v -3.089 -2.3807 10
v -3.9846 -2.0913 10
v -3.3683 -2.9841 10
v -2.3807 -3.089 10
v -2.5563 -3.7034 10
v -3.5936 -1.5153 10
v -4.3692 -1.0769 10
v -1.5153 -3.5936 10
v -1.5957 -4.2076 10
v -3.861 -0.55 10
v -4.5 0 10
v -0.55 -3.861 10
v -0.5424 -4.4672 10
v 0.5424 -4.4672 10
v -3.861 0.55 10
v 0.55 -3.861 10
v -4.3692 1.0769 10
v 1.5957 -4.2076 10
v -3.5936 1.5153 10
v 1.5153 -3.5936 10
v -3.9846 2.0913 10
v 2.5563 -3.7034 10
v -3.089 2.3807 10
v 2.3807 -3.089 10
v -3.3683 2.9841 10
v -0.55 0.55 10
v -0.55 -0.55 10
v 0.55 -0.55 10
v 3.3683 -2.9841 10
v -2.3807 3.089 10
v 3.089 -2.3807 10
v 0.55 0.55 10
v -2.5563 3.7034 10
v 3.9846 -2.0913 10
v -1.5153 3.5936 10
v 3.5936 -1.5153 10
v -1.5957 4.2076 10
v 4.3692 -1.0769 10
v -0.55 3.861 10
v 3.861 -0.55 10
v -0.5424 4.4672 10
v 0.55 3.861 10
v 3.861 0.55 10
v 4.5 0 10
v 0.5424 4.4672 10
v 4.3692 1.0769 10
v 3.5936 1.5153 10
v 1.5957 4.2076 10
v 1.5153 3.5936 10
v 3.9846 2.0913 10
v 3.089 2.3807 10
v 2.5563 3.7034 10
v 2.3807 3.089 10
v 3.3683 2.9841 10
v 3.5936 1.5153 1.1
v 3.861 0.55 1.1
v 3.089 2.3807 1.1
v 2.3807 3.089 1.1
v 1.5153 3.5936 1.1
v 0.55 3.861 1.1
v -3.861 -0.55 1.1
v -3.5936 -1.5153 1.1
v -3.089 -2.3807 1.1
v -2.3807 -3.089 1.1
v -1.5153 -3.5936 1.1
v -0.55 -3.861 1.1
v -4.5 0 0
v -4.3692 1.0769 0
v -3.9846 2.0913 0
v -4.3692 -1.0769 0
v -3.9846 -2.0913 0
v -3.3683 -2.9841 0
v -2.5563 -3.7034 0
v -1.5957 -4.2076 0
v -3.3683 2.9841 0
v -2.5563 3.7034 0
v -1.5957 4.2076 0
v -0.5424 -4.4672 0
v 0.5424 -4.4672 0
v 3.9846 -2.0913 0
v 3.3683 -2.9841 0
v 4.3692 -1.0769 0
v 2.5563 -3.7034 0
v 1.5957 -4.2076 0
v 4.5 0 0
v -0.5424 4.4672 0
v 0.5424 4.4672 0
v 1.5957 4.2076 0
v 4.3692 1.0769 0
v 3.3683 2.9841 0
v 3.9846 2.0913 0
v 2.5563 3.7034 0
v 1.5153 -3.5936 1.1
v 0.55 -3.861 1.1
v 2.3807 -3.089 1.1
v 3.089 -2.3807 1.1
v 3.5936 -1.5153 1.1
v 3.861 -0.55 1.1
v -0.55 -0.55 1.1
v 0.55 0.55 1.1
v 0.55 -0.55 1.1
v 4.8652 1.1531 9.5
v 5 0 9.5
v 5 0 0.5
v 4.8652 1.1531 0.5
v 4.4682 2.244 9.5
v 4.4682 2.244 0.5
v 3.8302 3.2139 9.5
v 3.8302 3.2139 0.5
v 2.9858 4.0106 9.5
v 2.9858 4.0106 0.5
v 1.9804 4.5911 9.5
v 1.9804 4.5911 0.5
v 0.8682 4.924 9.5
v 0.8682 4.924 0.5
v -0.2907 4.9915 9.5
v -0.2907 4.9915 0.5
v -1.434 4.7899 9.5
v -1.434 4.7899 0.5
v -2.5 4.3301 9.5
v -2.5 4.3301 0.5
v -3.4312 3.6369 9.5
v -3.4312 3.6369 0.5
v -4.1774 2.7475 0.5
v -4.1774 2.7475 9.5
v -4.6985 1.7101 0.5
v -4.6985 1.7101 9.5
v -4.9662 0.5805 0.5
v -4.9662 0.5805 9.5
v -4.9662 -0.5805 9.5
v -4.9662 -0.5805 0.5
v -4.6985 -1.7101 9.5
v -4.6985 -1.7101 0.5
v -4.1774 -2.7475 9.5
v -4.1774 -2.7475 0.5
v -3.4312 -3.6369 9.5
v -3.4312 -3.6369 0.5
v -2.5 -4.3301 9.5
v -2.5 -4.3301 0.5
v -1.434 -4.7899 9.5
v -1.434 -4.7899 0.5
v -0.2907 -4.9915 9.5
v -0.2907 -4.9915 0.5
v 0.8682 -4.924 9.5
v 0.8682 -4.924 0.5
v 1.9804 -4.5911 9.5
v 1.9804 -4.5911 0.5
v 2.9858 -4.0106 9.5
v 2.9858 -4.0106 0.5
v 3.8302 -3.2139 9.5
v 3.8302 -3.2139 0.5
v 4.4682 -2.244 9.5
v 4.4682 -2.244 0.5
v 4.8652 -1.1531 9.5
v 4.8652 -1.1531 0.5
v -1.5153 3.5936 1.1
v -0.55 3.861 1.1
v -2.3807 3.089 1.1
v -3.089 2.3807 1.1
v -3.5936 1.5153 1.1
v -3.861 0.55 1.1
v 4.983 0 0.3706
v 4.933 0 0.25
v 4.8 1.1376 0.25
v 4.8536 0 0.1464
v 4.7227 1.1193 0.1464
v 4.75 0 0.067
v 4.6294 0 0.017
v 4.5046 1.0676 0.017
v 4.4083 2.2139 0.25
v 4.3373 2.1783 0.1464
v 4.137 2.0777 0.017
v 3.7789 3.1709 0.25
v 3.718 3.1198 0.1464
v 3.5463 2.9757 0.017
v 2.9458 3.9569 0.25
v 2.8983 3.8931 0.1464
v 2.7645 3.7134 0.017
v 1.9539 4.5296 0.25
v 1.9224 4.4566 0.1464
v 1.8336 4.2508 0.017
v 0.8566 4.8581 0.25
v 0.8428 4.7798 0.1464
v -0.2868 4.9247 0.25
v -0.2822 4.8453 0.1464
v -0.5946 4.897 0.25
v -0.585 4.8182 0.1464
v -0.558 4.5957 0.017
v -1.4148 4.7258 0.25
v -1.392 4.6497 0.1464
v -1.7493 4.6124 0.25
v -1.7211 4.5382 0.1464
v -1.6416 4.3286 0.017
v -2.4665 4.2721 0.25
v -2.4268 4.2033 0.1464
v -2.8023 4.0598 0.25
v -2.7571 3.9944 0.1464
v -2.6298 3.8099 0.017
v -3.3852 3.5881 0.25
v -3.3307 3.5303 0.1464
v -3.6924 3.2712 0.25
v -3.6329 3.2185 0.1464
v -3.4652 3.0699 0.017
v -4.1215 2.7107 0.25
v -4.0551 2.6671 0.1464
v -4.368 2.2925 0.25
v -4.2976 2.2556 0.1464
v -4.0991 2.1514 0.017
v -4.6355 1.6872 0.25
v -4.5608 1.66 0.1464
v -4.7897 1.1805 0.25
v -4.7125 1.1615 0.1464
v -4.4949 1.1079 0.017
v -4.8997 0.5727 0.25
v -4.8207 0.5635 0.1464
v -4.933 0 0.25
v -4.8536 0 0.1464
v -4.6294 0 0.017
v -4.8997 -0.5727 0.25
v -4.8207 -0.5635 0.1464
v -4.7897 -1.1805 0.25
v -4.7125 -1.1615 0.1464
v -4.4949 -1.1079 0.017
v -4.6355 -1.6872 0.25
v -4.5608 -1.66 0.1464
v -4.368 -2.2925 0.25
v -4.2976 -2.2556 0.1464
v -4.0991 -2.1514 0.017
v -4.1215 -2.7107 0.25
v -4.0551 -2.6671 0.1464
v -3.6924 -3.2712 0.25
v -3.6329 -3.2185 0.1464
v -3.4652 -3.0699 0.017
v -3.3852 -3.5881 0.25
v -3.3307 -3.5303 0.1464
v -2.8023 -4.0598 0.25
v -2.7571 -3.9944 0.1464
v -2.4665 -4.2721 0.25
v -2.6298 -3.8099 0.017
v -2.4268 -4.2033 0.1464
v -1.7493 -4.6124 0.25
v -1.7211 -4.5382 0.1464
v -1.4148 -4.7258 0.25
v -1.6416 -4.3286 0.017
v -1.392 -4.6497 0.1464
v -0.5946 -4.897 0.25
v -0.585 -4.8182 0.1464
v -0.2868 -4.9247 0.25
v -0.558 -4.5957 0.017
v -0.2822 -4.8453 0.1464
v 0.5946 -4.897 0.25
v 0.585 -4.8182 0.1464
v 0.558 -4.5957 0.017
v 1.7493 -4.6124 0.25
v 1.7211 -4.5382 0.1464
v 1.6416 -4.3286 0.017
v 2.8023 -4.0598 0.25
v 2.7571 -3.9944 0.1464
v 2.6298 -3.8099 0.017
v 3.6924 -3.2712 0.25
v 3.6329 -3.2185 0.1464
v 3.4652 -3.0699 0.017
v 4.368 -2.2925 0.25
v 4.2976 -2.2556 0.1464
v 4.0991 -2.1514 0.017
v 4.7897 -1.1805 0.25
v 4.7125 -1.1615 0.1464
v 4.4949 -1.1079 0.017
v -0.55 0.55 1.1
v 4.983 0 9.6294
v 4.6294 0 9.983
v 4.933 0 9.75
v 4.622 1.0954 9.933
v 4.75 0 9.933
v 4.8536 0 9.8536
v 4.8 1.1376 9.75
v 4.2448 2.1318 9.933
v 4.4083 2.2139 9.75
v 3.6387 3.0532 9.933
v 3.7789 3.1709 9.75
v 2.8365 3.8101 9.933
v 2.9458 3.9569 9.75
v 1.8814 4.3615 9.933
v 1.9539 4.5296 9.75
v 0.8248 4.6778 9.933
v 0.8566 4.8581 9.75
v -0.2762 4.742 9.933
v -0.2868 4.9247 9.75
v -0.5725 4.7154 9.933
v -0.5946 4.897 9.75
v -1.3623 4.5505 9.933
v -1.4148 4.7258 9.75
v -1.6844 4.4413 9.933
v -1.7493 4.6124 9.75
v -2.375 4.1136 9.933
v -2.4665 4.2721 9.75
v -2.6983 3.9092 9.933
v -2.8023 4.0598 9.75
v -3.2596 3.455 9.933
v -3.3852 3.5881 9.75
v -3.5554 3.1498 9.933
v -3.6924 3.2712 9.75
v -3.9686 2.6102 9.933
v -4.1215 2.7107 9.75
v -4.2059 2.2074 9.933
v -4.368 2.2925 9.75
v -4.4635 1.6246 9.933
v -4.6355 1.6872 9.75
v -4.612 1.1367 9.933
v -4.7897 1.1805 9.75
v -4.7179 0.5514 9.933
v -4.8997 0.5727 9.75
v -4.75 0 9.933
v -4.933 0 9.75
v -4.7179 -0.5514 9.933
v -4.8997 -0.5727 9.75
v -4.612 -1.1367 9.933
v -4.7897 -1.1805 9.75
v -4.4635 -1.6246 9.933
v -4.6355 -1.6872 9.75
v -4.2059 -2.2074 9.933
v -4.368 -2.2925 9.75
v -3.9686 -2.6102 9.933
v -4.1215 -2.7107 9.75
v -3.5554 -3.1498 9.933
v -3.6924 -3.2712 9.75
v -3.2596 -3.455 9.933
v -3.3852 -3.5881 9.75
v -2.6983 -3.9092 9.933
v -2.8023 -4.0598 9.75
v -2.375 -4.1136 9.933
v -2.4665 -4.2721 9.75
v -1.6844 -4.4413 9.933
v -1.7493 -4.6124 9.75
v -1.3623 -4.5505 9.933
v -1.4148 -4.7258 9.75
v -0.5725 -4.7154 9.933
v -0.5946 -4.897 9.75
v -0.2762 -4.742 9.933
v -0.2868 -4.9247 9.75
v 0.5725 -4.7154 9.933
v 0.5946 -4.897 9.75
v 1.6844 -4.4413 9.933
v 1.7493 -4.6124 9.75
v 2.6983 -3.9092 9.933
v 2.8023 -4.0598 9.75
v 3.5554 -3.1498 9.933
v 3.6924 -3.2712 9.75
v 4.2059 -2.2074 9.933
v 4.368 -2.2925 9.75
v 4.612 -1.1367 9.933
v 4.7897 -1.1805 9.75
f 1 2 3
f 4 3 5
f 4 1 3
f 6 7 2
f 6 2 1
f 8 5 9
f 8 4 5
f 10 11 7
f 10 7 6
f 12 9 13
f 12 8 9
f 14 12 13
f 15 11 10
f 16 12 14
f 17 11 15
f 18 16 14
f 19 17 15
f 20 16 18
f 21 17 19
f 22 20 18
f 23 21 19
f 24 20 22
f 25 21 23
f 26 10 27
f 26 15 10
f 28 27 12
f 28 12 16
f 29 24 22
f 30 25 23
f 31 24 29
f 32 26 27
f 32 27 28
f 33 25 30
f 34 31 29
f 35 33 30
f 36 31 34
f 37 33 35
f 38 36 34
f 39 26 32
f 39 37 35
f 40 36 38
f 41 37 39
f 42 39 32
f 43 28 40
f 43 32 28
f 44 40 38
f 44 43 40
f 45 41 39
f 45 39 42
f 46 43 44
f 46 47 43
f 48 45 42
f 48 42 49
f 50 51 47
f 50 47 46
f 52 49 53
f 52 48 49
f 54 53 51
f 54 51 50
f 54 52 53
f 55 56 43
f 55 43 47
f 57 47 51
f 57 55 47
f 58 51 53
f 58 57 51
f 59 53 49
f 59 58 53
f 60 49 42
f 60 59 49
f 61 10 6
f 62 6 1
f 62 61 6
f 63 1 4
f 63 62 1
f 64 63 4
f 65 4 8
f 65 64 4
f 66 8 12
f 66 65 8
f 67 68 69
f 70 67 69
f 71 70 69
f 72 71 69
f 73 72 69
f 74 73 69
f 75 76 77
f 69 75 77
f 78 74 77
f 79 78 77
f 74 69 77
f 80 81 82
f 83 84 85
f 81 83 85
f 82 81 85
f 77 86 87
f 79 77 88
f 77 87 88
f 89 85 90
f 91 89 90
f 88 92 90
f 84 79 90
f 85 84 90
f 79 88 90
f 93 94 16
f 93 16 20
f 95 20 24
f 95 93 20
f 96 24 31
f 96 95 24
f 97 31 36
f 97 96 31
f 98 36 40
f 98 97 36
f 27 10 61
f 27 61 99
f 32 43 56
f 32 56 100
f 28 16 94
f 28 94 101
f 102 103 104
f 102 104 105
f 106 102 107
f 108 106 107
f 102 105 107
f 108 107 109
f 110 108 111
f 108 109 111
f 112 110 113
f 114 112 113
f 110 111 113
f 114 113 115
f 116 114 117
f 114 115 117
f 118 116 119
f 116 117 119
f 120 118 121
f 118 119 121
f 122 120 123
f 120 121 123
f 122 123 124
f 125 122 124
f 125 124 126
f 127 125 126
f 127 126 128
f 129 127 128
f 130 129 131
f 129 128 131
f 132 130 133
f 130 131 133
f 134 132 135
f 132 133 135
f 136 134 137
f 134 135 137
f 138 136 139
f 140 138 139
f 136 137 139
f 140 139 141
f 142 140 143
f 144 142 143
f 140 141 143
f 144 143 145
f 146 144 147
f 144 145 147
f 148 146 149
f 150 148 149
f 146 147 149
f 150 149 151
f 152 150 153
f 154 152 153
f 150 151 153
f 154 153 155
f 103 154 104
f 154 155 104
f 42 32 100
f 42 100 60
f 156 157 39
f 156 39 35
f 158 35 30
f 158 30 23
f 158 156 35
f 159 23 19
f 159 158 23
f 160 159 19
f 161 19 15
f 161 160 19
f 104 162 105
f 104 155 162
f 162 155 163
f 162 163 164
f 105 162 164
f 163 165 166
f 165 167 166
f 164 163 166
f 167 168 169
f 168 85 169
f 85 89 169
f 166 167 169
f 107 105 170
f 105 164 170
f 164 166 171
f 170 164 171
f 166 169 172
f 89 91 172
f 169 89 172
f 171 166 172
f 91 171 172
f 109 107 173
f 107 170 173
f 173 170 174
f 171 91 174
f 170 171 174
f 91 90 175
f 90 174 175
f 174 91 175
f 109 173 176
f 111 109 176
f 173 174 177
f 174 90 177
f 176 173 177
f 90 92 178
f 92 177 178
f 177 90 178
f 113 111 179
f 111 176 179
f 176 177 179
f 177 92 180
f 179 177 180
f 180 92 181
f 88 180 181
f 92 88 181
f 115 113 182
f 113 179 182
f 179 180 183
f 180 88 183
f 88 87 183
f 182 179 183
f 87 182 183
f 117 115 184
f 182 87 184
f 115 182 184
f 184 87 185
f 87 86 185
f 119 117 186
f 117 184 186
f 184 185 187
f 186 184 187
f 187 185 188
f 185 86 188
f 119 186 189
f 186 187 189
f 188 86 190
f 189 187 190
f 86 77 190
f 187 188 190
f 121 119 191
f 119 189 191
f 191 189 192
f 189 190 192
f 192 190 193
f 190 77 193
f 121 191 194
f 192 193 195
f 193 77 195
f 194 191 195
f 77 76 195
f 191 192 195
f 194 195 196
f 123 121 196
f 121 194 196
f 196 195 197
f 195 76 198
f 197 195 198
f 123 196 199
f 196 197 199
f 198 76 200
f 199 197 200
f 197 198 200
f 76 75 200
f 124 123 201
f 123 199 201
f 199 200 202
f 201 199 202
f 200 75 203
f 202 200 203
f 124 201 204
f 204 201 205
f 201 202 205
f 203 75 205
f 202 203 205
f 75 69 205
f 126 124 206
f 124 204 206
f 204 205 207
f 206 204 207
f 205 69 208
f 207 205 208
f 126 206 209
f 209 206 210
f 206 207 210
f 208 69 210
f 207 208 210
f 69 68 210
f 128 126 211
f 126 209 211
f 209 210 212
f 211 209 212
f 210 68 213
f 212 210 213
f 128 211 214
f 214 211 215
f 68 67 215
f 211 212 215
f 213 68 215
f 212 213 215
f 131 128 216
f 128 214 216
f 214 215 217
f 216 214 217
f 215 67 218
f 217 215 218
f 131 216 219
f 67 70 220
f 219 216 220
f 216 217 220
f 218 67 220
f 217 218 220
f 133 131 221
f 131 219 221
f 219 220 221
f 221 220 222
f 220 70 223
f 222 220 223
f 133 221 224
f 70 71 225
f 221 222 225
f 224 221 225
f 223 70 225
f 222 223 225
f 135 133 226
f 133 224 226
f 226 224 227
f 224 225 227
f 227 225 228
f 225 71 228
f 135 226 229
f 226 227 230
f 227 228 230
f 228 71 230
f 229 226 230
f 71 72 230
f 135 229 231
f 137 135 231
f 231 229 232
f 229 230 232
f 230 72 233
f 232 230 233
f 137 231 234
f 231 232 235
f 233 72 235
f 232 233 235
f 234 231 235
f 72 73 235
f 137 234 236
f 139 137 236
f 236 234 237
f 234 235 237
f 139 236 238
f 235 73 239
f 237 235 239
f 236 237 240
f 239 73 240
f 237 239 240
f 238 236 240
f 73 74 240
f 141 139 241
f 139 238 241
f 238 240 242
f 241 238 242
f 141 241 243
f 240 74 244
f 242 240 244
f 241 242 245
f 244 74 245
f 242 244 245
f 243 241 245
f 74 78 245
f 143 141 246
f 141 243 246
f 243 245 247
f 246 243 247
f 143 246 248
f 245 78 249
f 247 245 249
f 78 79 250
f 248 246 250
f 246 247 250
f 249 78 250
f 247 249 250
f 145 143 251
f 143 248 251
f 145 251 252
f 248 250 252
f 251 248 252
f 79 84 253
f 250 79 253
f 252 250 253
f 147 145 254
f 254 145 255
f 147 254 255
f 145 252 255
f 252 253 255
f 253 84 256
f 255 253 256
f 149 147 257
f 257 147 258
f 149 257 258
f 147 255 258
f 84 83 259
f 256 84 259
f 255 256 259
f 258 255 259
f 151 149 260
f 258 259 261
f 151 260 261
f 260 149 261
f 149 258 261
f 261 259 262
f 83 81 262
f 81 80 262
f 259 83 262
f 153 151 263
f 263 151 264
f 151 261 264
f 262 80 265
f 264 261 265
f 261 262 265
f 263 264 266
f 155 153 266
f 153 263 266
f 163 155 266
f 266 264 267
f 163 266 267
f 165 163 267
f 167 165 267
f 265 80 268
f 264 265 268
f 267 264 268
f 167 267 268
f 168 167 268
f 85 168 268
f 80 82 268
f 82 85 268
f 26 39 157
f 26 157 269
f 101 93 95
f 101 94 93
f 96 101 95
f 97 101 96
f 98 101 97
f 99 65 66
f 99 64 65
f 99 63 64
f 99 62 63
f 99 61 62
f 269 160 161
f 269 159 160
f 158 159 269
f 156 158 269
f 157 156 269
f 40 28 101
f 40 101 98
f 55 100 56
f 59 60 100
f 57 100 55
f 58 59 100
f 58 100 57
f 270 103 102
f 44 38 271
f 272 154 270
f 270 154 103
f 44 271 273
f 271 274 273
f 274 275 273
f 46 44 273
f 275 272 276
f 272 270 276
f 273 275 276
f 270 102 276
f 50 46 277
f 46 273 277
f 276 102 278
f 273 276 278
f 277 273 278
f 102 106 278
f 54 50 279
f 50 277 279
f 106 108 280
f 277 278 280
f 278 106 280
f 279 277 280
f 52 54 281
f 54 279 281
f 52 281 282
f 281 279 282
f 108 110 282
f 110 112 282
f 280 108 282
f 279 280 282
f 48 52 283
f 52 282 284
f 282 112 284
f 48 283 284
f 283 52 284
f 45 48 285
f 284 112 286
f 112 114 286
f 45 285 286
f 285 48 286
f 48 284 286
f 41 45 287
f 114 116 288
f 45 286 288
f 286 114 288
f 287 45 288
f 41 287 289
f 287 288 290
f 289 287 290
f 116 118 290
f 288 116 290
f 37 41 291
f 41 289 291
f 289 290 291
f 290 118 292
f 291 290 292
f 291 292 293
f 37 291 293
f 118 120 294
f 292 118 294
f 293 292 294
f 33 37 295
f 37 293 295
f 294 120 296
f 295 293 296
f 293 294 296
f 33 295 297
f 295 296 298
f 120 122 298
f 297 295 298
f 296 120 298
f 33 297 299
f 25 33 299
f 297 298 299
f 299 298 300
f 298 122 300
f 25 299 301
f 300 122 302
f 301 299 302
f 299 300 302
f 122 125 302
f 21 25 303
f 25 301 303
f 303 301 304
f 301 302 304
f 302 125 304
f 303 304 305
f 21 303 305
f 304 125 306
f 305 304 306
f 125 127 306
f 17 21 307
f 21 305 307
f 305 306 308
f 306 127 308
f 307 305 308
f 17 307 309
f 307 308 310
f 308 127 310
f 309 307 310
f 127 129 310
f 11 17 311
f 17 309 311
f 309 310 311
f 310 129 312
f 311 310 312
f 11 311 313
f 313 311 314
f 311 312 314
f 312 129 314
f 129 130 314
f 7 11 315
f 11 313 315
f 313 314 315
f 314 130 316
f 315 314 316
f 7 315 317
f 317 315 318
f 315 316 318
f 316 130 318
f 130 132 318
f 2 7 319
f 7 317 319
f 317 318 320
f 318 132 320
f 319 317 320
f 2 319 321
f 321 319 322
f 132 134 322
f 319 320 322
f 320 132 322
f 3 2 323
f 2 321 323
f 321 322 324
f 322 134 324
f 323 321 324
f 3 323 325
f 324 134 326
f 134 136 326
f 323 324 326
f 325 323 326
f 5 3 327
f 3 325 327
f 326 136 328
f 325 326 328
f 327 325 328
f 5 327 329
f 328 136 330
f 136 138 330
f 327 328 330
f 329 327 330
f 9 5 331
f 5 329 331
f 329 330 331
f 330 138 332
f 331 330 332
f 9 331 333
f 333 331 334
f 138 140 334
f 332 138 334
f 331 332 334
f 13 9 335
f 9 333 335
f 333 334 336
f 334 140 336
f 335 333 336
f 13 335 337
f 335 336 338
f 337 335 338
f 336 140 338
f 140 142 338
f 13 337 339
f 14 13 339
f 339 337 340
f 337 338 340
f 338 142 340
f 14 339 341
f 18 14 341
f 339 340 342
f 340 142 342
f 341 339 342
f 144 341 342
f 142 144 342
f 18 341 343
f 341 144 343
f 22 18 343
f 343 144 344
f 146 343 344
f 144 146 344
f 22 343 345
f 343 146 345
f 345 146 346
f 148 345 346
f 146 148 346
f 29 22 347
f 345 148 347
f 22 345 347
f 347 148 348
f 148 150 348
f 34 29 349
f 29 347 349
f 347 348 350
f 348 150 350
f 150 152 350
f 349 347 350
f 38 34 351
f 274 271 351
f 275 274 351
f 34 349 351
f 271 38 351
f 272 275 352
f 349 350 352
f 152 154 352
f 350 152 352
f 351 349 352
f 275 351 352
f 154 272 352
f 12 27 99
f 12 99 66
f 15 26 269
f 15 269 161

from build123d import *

# Parameters (mm, degrees)
F0_R     = 5
F1_DEPTH = 10
F2_T     = -1.1
F4_DEPTH = 8.9
F5_R     = 0.5


with BuildPart() as f1:
    # F0 (on Top) → F1 (new body)
    with BuildSketch(Plane.XY):
        Circle(F0_R)
    extrude(amount=F1_DEPTH)

    # F2
    f2_openings = [f1.faces().sort_by_distance(p)[0] for p in [
        (0, 0, 10),
    ]]
    offset(amount=F2_T, openings=f2_openings)

    # F3 (on face) → F4 (join, through all)
    with BuildSketch(Plane.XY.offset(1.1)):
        with BuildLine():
            Line((-0.55, 0.55), (-3.861023, 0.55))
            ThreePointArc((-3.861023, 0.55), (-3.9, 0), (-3.861023, -0.55))
            Line((-3.861023, -0.55), (-0.55, -0.55))
            Line((-0.55, -0.55), (-0.55, -3.861023))
            ThreePointArc((-0.55, -3.861023), (0, -3.9), (0.55, -3.861023))
            Line((0.55, -3.861023), (0.55, -0.55))
            Line((0.55, -0.55), (3.861023, -0.55))
            ThreePointArc((3.861023, -0.55), (3.9, 0), (3.861023, 0.55))
            Line((3.861023, 0.55), (0.55, 0.55))
            Line((0.55, 0.55), (0.55, 3.861023))
            ThreePointArc((0.55, 3.861023), (0, 3.9), (-0.55, 3.861023))
            Line((-0.55, 3.861023), (-0.55, 0.55))
        make_face()
    extrude(amount=F4_DEPTH)

    # F5
    f5_edges = [f1.edges().sort_by_distance(p)[0] for p in [
        (-5, 0, 10),
        (-5, 0, 0),
    ]]
    fillet(f5_edges, radius=F5_R)


solid = f1.part
